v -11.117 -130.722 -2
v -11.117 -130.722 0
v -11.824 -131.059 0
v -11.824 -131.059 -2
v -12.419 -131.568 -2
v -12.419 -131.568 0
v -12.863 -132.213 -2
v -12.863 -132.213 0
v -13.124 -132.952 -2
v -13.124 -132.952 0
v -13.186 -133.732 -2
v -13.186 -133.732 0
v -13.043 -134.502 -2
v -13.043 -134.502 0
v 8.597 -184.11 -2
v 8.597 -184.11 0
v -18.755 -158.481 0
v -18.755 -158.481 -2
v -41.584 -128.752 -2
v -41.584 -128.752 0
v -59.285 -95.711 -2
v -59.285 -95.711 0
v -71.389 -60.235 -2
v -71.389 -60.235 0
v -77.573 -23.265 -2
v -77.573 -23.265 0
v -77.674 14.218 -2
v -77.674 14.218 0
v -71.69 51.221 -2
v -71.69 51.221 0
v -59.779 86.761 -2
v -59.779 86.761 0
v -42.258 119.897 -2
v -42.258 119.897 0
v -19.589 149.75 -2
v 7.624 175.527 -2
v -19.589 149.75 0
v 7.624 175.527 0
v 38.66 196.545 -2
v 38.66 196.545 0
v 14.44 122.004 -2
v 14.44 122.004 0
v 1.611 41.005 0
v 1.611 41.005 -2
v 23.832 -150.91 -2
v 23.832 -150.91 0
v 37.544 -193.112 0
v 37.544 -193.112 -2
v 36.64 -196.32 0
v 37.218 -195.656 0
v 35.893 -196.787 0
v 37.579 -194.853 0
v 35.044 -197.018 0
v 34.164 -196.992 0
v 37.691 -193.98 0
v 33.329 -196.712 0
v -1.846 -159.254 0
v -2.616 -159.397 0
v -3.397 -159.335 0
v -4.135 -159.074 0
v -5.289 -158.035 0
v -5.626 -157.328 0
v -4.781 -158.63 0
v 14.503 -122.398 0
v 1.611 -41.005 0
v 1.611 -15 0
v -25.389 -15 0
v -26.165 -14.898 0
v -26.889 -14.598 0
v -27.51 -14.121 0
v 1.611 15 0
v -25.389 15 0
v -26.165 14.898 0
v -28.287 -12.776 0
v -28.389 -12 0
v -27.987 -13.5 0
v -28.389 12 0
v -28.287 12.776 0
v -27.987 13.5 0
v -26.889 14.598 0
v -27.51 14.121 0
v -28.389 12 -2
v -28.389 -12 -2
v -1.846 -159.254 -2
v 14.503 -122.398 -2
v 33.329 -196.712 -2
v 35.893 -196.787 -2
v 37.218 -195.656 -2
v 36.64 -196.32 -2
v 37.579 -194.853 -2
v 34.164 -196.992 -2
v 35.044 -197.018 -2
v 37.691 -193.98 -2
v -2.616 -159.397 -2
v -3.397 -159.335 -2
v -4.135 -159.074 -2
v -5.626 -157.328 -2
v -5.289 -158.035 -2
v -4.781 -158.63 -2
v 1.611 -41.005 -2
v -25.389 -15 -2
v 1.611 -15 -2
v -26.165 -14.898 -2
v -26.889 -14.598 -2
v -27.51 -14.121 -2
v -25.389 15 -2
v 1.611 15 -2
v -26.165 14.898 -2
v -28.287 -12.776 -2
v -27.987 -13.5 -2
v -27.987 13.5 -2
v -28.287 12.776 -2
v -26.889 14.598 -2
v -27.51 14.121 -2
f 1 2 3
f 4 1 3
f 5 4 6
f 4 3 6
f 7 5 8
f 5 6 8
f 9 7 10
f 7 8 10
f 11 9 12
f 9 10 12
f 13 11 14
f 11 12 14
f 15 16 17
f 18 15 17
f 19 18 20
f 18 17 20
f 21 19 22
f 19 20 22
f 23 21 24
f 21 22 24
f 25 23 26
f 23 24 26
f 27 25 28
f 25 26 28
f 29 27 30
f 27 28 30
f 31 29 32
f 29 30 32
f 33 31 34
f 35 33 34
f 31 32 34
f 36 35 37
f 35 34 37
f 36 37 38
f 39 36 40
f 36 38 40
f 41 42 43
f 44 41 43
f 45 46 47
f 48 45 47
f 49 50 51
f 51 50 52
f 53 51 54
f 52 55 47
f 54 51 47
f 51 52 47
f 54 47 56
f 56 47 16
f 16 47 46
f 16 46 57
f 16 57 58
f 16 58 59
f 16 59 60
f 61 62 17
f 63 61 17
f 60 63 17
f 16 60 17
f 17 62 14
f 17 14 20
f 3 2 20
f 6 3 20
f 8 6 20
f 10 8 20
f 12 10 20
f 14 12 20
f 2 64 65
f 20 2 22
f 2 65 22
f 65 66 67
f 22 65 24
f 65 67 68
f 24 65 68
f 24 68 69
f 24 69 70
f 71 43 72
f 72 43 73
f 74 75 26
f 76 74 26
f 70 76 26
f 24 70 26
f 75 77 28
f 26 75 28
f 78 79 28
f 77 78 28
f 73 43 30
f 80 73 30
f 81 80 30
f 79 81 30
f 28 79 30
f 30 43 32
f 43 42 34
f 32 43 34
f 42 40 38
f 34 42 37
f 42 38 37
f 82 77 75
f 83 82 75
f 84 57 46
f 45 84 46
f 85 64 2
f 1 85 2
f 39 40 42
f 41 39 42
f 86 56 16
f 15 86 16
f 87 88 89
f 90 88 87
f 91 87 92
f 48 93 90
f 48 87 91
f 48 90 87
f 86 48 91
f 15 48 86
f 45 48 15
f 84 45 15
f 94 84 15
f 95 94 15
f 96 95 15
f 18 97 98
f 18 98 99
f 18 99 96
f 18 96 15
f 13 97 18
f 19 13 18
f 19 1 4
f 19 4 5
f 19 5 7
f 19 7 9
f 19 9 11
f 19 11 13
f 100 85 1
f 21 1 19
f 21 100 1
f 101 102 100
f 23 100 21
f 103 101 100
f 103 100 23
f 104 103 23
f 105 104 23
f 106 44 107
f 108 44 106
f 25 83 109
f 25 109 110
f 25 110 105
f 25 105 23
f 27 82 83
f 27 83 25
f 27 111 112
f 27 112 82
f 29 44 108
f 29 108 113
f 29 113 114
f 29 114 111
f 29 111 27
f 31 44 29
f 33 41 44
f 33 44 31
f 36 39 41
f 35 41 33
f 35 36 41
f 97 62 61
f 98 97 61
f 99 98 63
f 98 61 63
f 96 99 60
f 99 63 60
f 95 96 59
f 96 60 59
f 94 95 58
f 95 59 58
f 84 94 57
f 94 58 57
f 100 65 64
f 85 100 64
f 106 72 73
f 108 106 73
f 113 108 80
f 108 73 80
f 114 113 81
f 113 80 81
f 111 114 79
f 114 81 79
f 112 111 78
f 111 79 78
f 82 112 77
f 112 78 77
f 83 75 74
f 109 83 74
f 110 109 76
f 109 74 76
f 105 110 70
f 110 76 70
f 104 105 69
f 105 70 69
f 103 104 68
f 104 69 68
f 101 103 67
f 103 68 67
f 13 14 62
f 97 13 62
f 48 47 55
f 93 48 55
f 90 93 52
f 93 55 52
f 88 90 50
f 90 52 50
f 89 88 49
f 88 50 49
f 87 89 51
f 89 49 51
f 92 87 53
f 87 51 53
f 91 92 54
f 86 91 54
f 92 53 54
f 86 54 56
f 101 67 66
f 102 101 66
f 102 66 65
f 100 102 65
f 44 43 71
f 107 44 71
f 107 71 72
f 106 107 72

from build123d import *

# Parameters (mm, degrees)
SM_BASE_FLANGE_1_DEPTH = 2


# Sheet-metal steps are written as plain solids
with BuildPart() as part:
    # Sketch 1 → Базовая кромка1 (new body)
    with BuildSketch(Plane.XY):
        with BuildLine():
            Line((-28.388920969, 12), (-28.388920969, -12))
            ThreePointArc((-28.388920969, -12), (-27.510241313, -14.121320344), (-25.388920969, -15))
            Line((-25.388920969, -15), (1.611079031, -15))
            Line((1.611079031, -15), (1.611079031, -41.004699494))
            Line((1.611079031, -41.004699494), (14.502501119, -122.397935229))
            Line((14.502501119, -122.397935229), (-11.116749626, -130.722134398))
            ThreePointArc((-11.116749626, -130.722134398), (-12.862718215, -132.213332448), (-13.042868191, -134.50235493))
            Line((-13.042868191, -134.50235493), (-5.626460326, -157.327711321))
            ThreePointArc((-5.626460326, -157.327711321), (-4.135262277, -159.073679911), (-1.846239794, -159.253829887))
            Line((-1.846239794, -159.253829887), (23.832286146, -150.910371039))
            Line((23.832286146, -150.910371039), (37.544374419, -193.111839379))
            ThreePointArc((37.544374419, -193.111839379), (36.639549016, -196.320108259), (33.329233371, -196.711909935))
            Line((33.329233371, -196.711909935), (8.597245129, -184.110332509))
            ThreePointArc((8.597245129, -184.110332509), (-77.67448455, 14.217890909), (38.659903534, 196.545084972))
            Line((38.659903534, 196.545084972), (14.44017549, 122.004426694))
            Line((14.44017549, 122.004426694), (1.611079031, 41.004699494))
            Line((1.611079031, 41.004699494), (1.611079031, 15))
            Line((1.611079031, 15), (-25.388920969, 15))
            ThreePointArc((-25.388920969, 15), (-27.510241313, 14.121320344), (-28.388920969, 12))
        make_face()
    extrude(amount=-SM_BASE_FLANGE_1_DEPTH)


solid = part.part
